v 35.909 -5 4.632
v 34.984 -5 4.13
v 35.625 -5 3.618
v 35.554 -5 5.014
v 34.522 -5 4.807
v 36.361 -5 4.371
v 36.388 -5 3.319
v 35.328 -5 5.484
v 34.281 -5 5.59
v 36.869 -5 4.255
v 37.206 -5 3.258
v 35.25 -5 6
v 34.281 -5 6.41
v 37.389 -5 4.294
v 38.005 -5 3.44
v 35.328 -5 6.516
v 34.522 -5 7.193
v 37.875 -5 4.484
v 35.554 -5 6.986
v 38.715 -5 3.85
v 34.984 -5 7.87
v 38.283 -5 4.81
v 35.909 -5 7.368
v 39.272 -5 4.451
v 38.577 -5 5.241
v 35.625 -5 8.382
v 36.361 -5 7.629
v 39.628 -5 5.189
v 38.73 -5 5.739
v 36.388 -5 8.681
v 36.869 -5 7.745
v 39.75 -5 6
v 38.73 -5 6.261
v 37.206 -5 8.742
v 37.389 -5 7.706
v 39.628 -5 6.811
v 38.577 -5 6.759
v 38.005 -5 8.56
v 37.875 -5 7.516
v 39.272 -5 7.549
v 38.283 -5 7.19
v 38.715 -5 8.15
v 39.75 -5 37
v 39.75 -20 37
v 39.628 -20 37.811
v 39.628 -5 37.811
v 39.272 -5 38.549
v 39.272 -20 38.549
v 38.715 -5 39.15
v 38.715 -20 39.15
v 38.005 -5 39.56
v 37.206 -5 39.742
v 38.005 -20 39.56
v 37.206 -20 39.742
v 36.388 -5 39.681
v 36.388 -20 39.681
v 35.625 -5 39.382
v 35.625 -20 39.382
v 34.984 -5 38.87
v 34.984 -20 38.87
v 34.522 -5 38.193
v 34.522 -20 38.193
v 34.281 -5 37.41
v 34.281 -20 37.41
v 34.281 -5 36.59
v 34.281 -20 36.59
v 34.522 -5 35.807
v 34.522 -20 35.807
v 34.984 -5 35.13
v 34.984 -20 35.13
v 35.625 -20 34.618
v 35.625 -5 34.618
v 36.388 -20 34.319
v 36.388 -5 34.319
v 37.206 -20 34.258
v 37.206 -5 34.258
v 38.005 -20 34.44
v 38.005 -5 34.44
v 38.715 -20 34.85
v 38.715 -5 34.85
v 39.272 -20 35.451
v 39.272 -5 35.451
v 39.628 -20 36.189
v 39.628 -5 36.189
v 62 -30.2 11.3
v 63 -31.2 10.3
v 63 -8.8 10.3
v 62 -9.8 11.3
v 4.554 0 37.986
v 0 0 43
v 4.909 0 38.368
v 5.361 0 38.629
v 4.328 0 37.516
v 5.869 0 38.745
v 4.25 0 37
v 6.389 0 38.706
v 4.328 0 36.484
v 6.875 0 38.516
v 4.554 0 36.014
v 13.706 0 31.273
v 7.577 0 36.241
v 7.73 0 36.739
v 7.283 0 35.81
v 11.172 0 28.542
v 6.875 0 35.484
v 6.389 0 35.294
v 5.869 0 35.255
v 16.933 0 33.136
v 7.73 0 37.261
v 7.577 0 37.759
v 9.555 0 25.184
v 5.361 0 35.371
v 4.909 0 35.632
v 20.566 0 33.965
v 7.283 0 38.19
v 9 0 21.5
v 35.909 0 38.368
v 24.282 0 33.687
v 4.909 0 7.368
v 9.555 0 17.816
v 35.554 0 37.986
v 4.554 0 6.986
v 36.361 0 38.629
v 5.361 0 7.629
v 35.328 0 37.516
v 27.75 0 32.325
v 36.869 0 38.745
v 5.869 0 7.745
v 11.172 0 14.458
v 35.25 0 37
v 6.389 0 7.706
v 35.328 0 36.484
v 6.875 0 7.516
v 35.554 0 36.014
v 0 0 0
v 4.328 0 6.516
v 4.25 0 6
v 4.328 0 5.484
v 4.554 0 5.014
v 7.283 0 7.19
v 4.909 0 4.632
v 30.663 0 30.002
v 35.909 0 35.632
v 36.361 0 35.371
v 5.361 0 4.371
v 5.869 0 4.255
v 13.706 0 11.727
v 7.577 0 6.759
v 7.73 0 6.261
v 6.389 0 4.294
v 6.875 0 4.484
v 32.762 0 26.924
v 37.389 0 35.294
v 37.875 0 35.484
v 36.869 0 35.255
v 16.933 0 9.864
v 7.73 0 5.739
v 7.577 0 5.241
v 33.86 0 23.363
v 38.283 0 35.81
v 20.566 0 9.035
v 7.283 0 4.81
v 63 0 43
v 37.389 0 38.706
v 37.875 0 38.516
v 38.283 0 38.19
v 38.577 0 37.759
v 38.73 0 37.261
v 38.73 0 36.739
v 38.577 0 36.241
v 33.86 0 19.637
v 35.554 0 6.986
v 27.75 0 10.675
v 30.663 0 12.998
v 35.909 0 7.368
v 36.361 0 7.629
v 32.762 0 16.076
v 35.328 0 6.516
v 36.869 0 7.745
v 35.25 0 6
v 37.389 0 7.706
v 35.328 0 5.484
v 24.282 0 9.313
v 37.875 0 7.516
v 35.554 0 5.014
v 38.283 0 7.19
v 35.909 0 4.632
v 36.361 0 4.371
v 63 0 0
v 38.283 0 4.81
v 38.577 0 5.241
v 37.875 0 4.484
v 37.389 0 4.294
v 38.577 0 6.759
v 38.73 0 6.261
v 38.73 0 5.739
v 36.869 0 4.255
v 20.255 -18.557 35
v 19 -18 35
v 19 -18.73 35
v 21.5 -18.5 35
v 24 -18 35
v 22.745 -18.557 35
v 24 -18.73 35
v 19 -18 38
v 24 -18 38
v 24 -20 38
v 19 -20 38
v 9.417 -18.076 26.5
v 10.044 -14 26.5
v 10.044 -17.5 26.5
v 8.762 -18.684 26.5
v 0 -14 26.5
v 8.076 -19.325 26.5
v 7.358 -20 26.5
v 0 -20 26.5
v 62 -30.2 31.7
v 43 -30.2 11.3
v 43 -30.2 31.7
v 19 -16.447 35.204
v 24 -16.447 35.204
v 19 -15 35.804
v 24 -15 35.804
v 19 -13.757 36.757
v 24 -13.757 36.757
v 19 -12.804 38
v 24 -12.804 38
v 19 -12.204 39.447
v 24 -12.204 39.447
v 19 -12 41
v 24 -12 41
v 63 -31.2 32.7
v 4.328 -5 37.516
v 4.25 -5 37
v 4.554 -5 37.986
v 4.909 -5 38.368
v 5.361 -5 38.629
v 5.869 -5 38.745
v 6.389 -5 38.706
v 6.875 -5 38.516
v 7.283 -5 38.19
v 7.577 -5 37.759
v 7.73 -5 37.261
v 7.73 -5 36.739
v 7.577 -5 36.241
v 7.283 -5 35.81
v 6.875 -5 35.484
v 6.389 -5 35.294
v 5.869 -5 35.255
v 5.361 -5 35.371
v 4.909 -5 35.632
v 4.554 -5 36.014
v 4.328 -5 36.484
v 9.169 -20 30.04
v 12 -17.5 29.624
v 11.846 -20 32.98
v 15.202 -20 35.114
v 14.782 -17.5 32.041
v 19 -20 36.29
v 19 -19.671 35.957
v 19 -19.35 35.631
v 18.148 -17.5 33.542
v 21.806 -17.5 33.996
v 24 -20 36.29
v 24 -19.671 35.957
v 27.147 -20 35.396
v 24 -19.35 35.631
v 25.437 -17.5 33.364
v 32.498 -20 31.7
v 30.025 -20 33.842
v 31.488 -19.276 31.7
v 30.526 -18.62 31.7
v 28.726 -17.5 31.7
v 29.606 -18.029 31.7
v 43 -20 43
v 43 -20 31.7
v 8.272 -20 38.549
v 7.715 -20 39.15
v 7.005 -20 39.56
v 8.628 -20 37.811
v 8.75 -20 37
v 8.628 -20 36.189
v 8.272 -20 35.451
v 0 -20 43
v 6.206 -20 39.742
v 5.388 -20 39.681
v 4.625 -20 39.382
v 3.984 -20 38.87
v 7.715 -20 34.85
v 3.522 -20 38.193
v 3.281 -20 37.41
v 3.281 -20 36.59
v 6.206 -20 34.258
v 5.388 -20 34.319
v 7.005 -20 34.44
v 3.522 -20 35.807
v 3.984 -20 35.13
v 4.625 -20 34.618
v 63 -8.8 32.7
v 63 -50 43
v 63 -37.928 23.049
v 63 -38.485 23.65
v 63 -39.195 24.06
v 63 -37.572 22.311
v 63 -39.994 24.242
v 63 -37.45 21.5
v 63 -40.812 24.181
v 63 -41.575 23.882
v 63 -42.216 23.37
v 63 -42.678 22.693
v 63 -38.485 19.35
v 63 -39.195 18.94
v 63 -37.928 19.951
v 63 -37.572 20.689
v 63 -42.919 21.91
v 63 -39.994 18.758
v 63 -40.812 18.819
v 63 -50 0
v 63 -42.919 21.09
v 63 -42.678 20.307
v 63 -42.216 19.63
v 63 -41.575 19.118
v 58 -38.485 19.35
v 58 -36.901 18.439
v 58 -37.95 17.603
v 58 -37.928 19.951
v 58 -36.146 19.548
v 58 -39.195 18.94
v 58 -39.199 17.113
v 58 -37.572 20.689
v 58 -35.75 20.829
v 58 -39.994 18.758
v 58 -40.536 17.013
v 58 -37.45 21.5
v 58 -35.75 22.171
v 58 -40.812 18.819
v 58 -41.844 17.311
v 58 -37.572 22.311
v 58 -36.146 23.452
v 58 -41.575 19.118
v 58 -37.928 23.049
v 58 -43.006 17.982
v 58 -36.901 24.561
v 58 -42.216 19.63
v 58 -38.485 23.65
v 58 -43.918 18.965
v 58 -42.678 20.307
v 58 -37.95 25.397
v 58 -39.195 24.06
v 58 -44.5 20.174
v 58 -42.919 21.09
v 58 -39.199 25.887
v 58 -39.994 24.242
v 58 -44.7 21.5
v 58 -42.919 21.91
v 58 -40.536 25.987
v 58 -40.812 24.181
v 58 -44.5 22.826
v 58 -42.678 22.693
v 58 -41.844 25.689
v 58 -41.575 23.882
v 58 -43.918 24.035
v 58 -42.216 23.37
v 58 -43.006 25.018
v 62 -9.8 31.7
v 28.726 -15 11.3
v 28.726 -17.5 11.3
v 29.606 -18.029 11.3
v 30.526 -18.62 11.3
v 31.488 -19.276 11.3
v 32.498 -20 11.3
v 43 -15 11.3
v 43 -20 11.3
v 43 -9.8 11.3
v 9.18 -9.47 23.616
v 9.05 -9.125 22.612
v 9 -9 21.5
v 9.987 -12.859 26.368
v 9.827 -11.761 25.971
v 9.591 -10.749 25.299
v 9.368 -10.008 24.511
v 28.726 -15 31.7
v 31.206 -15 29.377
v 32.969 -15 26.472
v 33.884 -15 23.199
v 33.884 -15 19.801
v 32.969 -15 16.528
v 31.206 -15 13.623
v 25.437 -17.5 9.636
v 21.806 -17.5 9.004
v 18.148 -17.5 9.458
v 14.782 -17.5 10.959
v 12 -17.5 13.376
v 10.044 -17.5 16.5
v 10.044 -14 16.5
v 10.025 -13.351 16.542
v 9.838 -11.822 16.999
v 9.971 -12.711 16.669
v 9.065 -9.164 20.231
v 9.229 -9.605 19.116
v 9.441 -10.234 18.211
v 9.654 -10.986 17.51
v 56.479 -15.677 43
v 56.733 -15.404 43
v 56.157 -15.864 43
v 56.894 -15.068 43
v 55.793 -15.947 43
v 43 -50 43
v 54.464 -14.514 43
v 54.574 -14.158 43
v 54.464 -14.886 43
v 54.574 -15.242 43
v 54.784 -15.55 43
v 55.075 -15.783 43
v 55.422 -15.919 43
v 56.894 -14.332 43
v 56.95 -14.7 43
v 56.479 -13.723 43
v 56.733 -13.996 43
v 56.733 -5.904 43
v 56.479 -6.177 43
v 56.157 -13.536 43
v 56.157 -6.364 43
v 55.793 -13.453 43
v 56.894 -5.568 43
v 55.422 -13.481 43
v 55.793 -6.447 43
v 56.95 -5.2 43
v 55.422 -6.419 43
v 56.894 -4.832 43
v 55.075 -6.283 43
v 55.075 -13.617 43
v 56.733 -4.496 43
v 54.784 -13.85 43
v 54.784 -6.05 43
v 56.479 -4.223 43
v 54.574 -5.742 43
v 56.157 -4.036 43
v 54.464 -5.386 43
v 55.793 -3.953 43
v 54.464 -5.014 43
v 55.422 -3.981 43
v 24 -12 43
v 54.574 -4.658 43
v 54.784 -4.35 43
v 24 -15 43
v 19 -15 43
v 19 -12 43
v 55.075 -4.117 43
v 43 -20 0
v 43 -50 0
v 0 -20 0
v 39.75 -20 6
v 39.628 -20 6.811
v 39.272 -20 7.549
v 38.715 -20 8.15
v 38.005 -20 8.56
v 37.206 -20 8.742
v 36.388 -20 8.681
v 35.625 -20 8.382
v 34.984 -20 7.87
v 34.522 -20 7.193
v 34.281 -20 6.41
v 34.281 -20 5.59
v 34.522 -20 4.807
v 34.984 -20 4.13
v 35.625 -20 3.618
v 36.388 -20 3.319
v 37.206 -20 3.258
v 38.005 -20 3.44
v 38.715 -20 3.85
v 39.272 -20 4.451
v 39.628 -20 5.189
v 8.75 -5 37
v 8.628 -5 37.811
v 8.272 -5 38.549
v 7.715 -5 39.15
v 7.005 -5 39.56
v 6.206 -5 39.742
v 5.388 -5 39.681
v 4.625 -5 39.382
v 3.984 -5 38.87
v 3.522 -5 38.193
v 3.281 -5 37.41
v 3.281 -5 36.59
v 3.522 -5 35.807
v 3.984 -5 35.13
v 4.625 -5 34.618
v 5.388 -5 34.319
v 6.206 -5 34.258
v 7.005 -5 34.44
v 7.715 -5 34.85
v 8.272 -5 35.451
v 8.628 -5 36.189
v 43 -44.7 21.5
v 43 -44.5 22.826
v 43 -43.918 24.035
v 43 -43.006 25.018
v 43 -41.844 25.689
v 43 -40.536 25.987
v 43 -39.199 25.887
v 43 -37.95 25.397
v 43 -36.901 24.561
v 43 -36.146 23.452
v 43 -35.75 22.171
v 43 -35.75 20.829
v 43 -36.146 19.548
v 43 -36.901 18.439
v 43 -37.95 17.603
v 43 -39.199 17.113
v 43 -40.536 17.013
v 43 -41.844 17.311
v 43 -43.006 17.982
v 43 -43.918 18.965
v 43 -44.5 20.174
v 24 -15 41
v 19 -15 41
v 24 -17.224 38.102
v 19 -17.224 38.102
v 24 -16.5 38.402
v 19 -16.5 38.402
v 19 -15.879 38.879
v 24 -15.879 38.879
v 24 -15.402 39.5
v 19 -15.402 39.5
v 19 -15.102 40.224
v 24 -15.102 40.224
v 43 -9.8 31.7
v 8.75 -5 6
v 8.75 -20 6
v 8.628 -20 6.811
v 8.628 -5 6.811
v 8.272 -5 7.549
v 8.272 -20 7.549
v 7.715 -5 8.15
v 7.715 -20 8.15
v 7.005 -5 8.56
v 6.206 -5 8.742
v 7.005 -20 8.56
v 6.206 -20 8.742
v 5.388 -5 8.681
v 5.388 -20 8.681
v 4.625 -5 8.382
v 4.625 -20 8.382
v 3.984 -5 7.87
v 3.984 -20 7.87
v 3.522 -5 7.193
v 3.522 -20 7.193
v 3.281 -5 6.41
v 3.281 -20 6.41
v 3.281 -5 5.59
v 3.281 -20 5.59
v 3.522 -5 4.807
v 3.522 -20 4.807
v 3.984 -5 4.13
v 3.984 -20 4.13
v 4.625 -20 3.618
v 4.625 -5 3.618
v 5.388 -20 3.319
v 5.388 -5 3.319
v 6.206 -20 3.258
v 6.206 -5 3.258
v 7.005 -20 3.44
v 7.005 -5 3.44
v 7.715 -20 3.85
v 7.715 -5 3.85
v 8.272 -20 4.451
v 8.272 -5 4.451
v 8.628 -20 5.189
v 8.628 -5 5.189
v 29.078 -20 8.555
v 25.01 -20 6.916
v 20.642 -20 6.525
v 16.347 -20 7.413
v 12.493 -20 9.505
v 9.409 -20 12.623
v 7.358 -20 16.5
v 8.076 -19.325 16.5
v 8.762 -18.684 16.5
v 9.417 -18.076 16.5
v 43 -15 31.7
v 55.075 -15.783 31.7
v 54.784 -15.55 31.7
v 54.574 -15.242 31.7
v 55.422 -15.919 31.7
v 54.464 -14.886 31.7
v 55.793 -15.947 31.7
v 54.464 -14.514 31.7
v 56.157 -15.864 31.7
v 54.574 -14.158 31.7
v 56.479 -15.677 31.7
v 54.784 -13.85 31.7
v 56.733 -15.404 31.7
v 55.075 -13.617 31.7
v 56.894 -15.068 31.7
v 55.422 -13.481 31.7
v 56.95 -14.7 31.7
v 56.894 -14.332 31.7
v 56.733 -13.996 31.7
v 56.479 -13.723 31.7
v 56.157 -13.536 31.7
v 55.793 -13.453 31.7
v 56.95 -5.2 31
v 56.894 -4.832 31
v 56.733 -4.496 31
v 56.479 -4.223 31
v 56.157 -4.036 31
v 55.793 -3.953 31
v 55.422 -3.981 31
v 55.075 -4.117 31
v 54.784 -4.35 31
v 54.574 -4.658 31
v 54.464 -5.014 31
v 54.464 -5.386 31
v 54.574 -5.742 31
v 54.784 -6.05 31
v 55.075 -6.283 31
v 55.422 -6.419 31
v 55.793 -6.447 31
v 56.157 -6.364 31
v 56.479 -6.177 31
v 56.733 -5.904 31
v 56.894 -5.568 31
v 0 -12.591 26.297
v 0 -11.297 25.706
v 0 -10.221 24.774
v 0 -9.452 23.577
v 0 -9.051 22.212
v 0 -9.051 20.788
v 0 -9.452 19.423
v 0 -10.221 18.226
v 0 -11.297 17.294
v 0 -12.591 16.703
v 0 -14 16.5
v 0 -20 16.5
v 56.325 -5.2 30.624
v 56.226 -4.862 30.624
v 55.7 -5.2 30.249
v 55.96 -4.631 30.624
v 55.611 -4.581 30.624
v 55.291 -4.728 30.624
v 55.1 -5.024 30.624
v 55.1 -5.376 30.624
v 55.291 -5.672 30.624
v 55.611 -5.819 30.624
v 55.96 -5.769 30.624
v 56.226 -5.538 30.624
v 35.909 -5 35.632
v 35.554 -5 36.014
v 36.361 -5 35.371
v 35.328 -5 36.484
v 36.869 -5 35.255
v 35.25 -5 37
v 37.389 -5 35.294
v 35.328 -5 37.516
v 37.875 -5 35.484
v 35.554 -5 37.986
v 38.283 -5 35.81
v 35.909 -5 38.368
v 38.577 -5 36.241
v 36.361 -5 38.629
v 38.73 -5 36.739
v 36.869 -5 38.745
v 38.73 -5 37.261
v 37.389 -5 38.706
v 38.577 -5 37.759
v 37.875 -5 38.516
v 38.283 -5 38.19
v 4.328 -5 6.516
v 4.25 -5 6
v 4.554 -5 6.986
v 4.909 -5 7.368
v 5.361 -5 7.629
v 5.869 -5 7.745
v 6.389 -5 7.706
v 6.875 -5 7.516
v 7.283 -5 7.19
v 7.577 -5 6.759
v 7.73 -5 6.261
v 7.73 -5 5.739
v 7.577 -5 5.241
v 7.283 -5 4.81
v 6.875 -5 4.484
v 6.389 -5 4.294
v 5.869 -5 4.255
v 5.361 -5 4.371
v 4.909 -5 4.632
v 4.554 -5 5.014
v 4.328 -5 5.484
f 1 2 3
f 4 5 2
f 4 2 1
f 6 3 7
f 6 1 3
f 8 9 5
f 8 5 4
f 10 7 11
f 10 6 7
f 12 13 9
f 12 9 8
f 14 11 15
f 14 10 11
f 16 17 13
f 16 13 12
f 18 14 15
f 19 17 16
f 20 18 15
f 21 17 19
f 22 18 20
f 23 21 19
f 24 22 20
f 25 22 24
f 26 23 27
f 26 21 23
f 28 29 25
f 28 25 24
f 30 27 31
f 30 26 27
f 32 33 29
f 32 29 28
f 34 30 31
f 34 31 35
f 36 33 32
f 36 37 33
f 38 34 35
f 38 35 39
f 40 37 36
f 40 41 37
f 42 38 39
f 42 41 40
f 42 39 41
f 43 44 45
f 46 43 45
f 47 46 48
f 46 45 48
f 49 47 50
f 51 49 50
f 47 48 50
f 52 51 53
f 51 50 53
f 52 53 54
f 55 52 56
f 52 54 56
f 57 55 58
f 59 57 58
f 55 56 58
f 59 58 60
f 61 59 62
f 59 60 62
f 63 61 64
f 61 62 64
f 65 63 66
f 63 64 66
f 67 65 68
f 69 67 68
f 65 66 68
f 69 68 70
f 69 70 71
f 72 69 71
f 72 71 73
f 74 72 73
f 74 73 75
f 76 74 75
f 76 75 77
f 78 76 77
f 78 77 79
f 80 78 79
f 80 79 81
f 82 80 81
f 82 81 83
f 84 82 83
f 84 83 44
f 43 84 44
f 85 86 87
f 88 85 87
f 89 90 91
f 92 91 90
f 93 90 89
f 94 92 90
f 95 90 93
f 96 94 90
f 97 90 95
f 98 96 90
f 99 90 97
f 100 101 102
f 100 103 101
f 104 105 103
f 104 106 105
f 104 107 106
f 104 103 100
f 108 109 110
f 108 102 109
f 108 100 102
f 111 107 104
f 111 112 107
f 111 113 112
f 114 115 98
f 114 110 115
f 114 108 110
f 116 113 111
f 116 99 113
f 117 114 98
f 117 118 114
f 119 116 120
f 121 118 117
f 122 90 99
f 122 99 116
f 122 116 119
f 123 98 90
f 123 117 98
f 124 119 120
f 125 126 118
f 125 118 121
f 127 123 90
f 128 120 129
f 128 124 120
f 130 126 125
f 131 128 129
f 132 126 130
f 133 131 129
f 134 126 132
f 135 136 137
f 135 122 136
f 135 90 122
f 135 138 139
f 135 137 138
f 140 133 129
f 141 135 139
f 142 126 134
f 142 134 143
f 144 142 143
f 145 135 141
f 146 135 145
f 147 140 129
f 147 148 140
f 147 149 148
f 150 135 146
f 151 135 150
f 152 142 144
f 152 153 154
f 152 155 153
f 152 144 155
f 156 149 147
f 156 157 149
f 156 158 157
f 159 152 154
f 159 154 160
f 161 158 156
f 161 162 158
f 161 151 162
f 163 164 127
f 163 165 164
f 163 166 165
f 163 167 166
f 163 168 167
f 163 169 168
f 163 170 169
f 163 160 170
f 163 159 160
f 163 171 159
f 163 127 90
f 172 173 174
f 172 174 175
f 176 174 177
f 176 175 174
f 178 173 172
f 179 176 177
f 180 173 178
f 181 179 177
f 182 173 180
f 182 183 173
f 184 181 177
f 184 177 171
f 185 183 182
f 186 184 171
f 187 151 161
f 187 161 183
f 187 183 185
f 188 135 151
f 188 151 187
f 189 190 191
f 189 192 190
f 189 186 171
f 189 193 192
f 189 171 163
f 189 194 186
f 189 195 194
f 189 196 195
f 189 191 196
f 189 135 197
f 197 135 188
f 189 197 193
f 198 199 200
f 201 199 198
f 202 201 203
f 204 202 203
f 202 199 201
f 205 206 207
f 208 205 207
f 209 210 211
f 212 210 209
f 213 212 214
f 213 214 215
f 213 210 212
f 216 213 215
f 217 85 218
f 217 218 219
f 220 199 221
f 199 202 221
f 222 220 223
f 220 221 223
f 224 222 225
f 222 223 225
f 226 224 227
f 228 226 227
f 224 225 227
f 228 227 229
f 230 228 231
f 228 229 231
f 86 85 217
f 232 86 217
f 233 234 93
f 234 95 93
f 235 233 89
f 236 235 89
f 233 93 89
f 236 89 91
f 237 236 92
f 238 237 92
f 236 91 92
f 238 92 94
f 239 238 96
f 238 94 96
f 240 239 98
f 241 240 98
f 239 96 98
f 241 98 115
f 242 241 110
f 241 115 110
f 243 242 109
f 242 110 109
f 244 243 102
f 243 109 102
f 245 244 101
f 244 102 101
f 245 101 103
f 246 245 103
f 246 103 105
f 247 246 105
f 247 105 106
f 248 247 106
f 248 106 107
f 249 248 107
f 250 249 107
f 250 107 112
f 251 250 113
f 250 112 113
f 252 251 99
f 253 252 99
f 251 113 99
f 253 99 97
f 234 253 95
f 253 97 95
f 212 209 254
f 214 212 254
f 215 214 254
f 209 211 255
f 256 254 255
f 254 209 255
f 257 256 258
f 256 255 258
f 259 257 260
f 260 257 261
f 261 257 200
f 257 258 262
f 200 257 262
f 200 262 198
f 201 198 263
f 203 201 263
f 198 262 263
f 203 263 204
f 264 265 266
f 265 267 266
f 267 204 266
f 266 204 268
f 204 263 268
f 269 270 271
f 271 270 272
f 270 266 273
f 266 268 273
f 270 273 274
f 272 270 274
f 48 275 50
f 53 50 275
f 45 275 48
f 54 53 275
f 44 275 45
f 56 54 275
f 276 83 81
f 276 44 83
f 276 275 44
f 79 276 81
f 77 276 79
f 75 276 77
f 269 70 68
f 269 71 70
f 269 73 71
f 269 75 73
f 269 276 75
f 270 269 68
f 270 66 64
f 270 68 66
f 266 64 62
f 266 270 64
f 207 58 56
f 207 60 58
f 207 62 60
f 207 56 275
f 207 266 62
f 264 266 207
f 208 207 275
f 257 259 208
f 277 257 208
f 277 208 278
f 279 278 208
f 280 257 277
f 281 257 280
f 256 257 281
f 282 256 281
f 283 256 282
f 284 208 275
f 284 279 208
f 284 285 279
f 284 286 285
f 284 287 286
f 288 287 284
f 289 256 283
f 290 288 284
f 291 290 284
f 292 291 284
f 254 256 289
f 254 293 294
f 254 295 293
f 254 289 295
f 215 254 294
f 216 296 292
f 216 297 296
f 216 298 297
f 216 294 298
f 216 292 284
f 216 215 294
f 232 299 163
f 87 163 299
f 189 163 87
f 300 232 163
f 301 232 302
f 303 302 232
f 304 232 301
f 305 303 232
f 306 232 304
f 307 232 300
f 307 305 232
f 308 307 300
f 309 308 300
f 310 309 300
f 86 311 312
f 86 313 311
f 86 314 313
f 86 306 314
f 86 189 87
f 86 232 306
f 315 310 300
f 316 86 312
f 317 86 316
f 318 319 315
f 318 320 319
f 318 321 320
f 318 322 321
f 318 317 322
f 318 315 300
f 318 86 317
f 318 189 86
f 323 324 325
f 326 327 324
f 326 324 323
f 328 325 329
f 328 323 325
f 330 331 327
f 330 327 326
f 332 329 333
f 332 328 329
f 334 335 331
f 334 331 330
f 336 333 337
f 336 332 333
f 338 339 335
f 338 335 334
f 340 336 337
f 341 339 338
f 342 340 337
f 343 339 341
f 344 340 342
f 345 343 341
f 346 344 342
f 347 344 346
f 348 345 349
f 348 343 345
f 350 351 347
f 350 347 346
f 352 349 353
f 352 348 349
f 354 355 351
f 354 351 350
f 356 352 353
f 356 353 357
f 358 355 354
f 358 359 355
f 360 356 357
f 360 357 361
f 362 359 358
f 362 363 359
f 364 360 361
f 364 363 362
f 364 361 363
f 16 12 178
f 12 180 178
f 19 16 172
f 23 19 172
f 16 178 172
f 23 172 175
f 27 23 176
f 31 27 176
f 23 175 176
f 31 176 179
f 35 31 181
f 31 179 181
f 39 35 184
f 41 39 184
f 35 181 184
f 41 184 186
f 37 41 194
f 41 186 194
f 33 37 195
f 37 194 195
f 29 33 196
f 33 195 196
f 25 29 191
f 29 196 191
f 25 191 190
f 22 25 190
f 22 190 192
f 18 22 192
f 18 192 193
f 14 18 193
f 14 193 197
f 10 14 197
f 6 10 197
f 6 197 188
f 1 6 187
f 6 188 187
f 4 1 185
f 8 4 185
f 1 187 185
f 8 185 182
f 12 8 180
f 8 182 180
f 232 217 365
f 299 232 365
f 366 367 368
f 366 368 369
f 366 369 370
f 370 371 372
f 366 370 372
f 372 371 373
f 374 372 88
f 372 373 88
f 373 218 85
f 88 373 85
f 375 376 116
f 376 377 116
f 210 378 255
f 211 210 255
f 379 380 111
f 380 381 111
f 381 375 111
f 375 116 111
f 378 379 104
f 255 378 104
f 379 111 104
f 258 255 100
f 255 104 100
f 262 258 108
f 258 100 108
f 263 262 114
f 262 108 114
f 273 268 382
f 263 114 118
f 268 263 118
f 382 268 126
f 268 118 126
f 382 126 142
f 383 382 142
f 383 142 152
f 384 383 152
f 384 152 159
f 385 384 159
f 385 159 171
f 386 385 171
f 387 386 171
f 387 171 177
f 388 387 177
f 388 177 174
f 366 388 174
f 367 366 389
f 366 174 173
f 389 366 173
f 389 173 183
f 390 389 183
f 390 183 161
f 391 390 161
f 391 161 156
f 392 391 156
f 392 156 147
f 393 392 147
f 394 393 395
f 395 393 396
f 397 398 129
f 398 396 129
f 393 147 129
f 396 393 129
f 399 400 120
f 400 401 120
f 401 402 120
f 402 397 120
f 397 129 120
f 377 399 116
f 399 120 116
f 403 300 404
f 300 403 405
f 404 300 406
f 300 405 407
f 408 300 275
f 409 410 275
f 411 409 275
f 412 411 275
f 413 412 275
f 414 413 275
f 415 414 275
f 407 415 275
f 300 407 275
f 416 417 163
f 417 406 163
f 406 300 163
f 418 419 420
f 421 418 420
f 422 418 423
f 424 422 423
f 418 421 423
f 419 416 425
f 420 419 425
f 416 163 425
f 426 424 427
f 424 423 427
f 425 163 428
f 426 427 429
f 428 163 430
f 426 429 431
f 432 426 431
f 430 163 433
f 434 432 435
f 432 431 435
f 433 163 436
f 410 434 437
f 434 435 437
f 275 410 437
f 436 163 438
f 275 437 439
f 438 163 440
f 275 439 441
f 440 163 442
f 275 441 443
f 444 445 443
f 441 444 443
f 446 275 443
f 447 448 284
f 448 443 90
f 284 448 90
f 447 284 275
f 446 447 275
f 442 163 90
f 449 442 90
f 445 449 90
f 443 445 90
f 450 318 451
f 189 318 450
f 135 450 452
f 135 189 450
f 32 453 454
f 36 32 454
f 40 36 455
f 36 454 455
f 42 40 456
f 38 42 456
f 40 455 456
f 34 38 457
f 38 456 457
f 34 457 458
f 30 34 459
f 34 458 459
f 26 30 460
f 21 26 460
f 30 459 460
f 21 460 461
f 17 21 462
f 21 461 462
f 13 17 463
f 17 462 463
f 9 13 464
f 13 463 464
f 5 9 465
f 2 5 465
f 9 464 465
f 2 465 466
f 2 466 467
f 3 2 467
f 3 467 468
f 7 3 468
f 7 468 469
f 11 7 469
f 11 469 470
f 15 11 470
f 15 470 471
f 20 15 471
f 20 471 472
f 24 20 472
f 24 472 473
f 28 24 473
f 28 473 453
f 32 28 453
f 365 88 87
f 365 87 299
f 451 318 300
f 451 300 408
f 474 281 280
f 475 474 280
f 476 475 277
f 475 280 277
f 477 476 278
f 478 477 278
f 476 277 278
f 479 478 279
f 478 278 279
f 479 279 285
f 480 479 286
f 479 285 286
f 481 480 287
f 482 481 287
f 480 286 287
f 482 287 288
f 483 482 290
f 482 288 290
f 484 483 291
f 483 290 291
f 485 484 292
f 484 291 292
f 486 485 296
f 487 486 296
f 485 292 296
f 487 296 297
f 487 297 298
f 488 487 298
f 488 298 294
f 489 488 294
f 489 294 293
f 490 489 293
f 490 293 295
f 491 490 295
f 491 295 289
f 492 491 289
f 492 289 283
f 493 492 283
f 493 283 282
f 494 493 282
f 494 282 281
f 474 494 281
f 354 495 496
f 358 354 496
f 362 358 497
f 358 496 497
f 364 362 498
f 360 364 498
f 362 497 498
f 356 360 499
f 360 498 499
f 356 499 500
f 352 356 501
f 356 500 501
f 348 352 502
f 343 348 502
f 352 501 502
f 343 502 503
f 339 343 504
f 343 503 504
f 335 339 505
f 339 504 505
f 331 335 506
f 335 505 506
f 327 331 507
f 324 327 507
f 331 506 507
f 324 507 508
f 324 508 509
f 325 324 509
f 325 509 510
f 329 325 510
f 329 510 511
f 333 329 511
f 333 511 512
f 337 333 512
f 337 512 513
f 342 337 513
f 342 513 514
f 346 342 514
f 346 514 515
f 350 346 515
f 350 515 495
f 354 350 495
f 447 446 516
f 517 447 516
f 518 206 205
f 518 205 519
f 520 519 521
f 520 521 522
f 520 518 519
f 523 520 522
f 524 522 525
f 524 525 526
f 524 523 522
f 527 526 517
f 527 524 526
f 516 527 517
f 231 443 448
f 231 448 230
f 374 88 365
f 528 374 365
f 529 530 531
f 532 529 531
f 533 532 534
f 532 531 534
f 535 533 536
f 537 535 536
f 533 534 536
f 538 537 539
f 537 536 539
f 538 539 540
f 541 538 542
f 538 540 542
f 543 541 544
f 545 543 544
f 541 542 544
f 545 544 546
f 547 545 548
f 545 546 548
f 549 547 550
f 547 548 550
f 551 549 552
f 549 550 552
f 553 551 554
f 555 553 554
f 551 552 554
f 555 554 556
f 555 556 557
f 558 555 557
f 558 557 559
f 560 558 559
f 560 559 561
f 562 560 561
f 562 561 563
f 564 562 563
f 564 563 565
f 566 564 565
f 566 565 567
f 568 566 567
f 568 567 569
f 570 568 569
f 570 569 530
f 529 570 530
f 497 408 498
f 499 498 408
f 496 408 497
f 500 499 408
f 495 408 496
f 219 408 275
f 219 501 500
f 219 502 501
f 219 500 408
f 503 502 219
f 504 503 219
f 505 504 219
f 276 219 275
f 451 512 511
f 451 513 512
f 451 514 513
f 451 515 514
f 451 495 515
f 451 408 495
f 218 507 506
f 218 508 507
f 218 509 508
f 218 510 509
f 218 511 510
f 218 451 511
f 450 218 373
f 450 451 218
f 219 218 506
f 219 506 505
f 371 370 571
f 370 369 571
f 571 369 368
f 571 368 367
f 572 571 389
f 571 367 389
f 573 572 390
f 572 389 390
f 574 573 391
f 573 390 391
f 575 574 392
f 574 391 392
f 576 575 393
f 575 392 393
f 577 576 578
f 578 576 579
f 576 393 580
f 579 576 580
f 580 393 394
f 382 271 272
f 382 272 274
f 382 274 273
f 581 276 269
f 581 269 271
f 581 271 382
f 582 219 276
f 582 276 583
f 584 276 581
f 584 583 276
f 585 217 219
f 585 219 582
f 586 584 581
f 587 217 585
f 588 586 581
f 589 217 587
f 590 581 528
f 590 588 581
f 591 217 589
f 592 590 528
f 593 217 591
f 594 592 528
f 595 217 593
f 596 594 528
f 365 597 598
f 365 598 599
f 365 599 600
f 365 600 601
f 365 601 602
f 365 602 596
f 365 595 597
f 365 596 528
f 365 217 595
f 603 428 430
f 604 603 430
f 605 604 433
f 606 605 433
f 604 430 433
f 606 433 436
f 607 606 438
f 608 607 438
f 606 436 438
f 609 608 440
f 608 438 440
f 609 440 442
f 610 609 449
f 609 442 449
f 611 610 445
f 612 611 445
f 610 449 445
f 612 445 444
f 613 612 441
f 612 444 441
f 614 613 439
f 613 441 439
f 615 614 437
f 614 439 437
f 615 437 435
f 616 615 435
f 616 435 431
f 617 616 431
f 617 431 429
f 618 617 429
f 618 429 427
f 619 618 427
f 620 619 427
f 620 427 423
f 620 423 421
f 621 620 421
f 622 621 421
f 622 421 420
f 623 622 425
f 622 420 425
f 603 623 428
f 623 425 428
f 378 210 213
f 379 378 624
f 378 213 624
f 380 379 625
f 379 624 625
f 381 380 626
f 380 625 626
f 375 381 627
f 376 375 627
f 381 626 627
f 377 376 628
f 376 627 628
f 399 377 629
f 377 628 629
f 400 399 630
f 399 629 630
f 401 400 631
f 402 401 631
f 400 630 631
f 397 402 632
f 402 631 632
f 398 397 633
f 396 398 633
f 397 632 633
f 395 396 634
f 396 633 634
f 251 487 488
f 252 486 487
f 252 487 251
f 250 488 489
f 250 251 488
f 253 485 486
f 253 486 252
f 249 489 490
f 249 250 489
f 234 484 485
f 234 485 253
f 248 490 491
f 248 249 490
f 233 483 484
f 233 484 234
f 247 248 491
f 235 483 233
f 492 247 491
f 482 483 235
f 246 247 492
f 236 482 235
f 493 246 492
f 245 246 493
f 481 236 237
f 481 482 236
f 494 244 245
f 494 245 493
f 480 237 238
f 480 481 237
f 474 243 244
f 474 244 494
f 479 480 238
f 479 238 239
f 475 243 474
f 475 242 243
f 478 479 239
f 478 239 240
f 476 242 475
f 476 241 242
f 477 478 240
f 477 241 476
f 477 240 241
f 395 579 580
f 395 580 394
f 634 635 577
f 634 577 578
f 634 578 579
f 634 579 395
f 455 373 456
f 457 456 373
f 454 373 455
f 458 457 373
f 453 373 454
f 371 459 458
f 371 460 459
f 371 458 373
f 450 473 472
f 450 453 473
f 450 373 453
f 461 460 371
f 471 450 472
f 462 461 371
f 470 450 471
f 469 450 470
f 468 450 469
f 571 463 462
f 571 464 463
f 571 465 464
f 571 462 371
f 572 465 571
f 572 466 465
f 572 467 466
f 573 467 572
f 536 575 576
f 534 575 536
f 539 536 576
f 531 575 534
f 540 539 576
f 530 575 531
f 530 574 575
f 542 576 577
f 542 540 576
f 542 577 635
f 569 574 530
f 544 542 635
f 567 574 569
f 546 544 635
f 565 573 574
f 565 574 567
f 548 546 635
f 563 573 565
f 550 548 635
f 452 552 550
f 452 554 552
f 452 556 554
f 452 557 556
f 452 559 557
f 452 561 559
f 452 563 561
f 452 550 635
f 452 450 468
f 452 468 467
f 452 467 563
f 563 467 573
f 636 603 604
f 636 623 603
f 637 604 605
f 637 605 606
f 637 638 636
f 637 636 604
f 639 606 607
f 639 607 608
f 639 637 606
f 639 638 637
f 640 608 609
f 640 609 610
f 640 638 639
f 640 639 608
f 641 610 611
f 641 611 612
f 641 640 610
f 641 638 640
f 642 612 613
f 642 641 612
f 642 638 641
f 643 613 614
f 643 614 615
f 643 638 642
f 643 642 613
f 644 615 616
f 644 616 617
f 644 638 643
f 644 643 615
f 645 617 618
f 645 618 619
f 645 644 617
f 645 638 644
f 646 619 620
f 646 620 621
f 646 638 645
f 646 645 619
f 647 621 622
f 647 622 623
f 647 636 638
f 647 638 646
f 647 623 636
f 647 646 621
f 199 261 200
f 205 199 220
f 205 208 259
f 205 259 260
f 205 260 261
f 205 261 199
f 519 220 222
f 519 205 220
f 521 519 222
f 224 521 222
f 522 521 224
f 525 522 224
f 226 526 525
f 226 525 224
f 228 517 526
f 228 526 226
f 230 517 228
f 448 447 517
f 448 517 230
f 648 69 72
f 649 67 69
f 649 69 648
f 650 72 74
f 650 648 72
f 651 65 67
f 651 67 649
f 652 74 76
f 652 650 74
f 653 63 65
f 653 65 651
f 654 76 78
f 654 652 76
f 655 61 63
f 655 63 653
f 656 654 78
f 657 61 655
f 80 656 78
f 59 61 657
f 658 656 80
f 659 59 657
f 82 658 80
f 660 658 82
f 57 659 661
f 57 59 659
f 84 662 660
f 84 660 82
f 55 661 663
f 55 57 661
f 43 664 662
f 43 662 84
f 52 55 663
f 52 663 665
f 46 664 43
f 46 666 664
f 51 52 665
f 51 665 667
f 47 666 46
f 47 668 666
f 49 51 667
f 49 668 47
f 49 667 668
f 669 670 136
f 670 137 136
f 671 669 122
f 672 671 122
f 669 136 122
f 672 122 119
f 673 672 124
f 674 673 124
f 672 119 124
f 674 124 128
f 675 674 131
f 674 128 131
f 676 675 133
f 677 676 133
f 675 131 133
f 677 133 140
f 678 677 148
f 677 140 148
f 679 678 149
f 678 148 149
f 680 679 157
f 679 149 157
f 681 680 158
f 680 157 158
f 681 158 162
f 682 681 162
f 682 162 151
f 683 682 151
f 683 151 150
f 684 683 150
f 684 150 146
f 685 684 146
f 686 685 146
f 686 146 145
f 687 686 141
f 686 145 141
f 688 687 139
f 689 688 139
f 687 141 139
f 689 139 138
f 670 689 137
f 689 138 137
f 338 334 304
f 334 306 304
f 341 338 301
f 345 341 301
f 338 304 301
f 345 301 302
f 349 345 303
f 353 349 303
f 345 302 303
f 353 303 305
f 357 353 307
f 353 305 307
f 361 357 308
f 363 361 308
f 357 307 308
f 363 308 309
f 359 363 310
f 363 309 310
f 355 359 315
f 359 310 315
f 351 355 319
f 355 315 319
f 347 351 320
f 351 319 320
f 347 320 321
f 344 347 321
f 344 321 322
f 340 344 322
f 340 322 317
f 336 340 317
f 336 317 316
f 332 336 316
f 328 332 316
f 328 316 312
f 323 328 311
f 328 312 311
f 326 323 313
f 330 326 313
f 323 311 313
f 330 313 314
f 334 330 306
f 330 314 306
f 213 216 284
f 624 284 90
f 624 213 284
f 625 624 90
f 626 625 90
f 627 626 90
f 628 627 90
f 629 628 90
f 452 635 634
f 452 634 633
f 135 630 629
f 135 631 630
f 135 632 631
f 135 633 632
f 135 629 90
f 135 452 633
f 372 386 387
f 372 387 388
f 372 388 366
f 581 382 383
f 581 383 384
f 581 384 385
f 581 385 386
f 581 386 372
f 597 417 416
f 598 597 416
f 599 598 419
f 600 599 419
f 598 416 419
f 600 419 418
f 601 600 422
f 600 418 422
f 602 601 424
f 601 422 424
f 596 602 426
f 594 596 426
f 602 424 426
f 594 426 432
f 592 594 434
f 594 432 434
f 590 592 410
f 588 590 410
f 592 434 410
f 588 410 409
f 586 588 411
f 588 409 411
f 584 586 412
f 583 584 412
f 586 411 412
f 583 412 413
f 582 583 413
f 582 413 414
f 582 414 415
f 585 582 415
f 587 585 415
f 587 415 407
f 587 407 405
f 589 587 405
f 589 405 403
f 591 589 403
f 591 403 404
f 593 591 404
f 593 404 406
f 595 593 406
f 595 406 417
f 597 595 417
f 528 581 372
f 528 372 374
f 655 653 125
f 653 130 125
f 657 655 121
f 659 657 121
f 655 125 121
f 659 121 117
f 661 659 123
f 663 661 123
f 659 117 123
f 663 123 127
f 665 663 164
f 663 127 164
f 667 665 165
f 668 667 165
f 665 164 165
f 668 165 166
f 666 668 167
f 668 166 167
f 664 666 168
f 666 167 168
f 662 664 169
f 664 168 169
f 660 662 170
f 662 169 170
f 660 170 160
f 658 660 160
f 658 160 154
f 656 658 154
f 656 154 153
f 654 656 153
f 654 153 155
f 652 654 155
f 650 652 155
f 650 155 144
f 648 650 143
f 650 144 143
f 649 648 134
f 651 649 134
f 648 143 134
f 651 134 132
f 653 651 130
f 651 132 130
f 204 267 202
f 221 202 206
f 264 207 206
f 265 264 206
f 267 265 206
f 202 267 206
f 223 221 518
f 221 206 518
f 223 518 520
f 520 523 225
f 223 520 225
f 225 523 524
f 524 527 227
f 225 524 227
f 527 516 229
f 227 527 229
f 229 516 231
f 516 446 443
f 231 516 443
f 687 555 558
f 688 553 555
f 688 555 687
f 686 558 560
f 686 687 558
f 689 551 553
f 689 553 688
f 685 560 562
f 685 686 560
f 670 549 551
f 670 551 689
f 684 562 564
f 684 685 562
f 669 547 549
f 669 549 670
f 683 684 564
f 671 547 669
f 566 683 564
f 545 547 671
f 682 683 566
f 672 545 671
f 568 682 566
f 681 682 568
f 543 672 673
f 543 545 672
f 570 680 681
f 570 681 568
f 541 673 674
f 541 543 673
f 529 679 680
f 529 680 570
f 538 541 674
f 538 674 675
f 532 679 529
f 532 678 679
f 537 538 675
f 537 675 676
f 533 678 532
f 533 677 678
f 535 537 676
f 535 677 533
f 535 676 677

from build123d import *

# Parameters (mm, degrees)
PAD_DEPTH           = 43
HOLE_D              = 25
HOLE_CSINK_D        = 30
HOLE_CSINK_ANGLE    = 90
HOLE001_D           = 3.5
HOLE001_CBORE_D     = 5.5
HOLE001_CBORE_DEPTH = 15
SKETCH003_W         = 62.209956
SKETCH003_H         = 20.4
POCKET_DEPTH        = 5
POCKET_DEPTH_BACK   = 5
POCKET001_DEPTH     = 20
SKETCH005_W         = 20.4
SKETCH005_H         = 20.4
POCKET002_DEPTH     = 20
HOLE002_D           = 5.5
HOLE002_DEPTH       = 25
HOLE002_CBORE_D     = 9
HOLE002_CBORE_DEPTH = 15
CHAMFER_SIZE        = 1
SKETCH007_R         = 1.25
HOLE003_DEPTH       = 12
HOLE003_TIPS_R      = 1.25
POCKET003_DEPTH     = 2.5


with BuildPart() as part:
    # Sketch → Pad (new body)
    with BuildSketch(Plane.XY):
        Polygon((43, -20), (0, -20), (0, 0), (63, 0), (63, -50), (43, -50), align=None)
    extrude(amount=PAD_DEPTH)

    # Hole (through all)
    with Locations(Plane.XZ.offset(20)):
        with Locations((21.5, 21.5)):
            CounterSinkHole(HOLE_D / 2, HOLE_CSINK_D / 2, counter_sink_angle=HOLE_CSINK_ANGLE)

    # Hole001 (through all)
    with Locations(Plane.XZ.offset(20)):
        with Locations((6, 37), (37, 37), (37, 6), (6, 6)):
            CounterBoreHole(HOLE001_D / 2, HOLE001_CBORE_D / 2, HOLE001_CBORE_DEPTH)

    # Sketch003 (on Face1 of Hole001) → Pocket (cut, two sides)
    with BuildSketch(Plane.XZ.offset(20)) as pocket_sk:
        with Locations((54.005183, 21.5)):
            Rectangle(SKETCH003_W, SKETCH003_H)
    extrude(amount=-POCKET_DEPTH, mode=Mode.SUBTRACT)
    extrude(pocket_sk.sketch, amount=POCKET_DEPTH_BACK, mode=Mode.SUBTRACT)

    # Sketch004 (on Face3 of Pocket) → Pocket001 (cut)
    with BuildSketch(Plane(origin=(0, 0, 0), x_dir=(0, -1, 0), z_dir=(-1, 0, 0))):
        with BuildLine():
            ThreePointArc((14, 26.5), (9, 21.5), (14, 16.5))
            Line((20, 16.5), (14, 16.5))
            Line((20, 26.5), (20, 16.5))
            Line((14, 26.5), (20, 26.5))
        make_face()
    extrude(amount=-POCKET001_DEPTH, mode=Mode.SUBTRACT)

    # Sketch005 (on Face11 of Pocket001) → Pocket002 (cut)
    with BuildSketch(Plane.YZ.offset(63)):
        with Locations((-20, 21.5)):
            Rectangle(SKETCH005_W, SKETCH005_H)
    extrude(amount=-POCKET002_DEPTH, mode=Mode.SUBTRACT)

    # Hole002
    with Locations(Plane(origin=(43, 0, 0), x_dir=(0, -1, 0), z_dir=(-1, 0, 0))):
        with Locations((40.2, 21.5)):
            CounterBoreHole(HOLE002_D / 2, HOLE002_CBORE_D / 2, HOLE002_CBORE_DEPTH, depth=HOLE002_DEPTH)

    # Chamfer
    chamfer_edges = [part.edges().sort_by_distance(p)[0] for p in [
        (63, -27.6, 31.7),
        (63, -30.2, 21.5),
        (63, -20, 31.7),
        (63, -12.4, 31.7),
        (63, -9.8, 21.5),
        (63, -12.4, 11.3),
        (63, -20, 11.3),
        (63, -27.6, 11.3),
    ]]
    chamfer(chamfer_edges, length=CHAMFER_SIZE)

    # Sketch007 (on Face12 of Chamfer) → Hole003 (cut)
    with BuildSketch(Plane.XY.offset(43)):
        with Locations((55.7, -5.2)):
            Circle(SKETCH007_R)
        with Locations((55.7, -14.7)):
            Circle(SKETCH007_R)
    extrude(amount=-HOLE003_DEPTH, mode=Mode.SUBTRACT)

    # Hole003 tips → Hole003 tip 1 section 0
    with BuildSketch(Plane.XY.offset(31), mode=Mode.PRIVATE) as hole003_tip_1_s0:
        with Locations((55.7, -5.2)):
            Circle(HOLE003_TIPS_R)
    loft([hole003_tip_1_s0.sketch, Vertex(55.7, -5.2, 30.248924)], mode=Mode.SUBTRACT)

    # Hole003 tips → Hole003 tip 2 section 0
    with BuildSketch(Plane.XY.offset(31), mode=Mode.PRIVATE) as hole003_tip_2_s0:
        with Locations((55.7, -14.7)):
            Circle(HOLE003_TIPS_R)
    loft([hole003_tip_2_s0.sketch, Vertex(55.7, -14.7, 30.248924)], mode=Mode.SUBTRACT)

    # Sketch008 → Pocket003 (cut, symmetric)
    with BuildSketch(Plane.YZ.offset(21.5)):
        with BuildLine():
            ThreePointArc((-18, 35), (-13.757359, 36.757359), (-12, 41))
            Line((-12, 43), (-12, 41))
            Line((-12, 43), (-15, 43))
            Line((-15, 43), (-15, 41))
            ThreePointArc((-18, 38), (-15.87868, 38.87868), (-15, 41))
            Line((-18, 38), (-20, 38))
            Line((-20, 35), (-20, 38))
            Line((-18, 35), (-20, 35))
        make_face()
    extrude(amount=POCKET003_DEPTH, both=True, mode=Mode.SUBTRACT)


solid = part.part
